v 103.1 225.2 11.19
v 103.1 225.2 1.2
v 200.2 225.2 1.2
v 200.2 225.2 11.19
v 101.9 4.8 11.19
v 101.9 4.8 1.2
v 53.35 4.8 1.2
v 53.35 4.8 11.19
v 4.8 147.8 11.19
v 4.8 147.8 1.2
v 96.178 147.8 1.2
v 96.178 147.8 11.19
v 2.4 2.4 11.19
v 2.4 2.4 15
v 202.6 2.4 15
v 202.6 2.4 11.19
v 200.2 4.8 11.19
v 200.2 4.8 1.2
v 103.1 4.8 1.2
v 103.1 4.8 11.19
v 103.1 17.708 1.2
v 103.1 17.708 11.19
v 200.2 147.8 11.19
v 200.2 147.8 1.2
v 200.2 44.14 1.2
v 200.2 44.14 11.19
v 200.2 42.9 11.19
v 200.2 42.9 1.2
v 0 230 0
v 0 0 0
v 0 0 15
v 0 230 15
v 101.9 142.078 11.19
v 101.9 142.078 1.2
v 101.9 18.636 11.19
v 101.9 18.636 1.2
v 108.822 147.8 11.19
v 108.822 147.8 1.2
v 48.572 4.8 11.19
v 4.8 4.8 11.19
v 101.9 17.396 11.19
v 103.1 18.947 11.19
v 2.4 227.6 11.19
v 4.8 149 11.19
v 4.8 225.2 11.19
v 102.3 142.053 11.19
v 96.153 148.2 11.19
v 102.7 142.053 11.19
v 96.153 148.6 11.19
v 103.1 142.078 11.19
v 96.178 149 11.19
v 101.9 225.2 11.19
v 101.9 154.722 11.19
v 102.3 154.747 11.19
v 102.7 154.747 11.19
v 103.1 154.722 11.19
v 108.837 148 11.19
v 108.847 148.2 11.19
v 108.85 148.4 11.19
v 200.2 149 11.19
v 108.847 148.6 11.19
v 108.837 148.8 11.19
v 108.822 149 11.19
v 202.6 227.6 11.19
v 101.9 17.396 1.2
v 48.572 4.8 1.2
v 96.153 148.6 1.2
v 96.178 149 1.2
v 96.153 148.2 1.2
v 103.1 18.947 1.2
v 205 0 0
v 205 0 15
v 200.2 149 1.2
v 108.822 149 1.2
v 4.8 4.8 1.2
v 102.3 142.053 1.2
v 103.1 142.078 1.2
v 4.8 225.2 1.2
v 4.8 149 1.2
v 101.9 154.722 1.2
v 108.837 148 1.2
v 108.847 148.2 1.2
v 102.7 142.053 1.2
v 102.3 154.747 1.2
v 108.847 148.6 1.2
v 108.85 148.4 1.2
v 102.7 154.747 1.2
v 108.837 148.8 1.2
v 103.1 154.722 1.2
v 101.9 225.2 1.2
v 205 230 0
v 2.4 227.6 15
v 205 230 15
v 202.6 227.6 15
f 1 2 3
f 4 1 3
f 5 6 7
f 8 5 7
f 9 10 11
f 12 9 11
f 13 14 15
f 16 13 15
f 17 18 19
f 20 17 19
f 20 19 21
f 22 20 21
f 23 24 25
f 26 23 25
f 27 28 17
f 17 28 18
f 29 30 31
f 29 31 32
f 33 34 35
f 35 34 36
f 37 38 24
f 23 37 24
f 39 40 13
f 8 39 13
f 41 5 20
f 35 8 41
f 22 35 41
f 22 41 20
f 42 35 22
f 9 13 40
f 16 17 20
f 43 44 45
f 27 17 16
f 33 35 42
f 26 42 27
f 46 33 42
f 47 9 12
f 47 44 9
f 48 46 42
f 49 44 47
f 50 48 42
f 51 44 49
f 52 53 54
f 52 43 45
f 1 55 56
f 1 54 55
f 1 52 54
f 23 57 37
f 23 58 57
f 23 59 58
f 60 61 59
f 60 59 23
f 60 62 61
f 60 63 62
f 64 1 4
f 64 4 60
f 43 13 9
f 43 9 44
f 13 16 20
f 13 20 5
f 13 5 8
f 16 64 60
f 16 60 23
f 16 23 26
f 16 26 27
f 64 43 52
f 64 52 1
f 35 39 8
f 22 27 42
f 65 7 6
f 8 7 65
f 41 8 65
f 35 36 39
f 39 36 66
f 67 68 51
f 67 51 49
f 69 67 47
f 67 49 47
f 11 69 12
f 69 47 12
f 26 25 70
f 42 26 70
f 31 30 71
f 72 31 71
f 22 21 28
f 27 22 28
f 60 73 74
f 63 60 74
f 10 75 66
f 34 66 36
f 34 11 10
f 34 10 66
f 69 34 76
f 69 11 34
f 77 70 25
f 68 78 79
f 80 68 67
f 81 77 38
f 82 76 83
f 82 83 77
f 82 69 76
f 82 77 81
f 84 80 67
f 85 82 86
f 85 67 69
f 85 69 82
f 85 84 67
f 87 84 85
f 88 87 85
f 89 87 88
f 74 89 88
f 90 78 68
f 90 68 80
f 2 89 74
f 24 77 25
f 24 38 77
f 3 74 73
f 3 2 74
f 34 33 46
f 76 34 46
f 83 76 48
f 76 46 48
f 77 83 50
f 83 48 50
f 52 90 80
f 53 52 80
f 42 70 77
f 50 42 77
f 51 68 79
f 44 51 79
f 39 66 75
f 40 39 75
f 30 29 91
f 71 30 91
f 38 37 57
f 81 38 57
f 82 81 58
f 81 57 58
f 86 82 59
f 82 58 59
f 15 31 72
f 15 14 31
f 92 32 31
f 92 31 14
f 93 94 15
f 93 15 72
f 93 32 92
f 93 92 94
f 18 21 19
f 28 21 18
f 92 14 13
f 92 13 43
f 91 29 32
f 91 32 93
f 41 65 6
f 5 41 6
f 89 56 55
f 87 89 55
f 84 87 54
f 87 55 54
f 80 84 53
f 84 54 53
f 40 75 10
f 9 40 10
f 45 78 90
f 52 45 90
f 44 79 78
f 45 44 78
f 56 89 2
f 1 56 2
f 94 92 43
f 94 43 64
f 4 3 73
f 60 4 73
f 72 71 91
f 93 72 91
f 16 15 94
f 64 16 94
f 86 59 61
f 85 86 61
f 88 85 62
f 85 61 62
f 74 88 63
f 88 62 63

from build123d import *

# Parameters (mm, degrees)
F0_W     = 205
F0_H     = 230
F1_DEPTH = 15
F2_W     = 200.2
F2_H     = 225.2
F3_DEPTH = 13.8
F4_W     = 200.2
F4_H     = 225.2
F5_DEPTH = 9.99
F7_DEPTH = 9.99
F9_DEPTH = 9.99


with BuildPart() as f1:
    # F0 (on Top) → F1 (new body)
    with BuildSketch(Plane.XY):
        with Locations((102.5, 115)):
            Rectangle(F0_W, F0_H)
    extrude(amount=F1_DEPTH)

    # F2 (on face) → F3 (cut, through all)
    with BuildSketch(Plane.XY.offset(15)):
        with Locations((102.5, 115)):
            Rectangle(F2_W, F2_H)
    extrude(amount=-F3_DEPTH, mode=Mode.SUBTRACT)

    # F4 (on face) → F5 (join, through all)
    with BuildSketch(Plane.XY.offset(1.2)):
        with Locations((102.5, 115)):
            Rectangle(F4_W, F4_H)
        Polygon((4.8, 149), (4.8, 225.2), (101.9, 225.2), (103.1, 225.2), (200.2, 225.2), (200.2, 149), (200.2, 147.8), (200.2, 4.8), (103.1, 4.8), (101.9, 4.8), (4.8, 4.8), (4.8, 147.8), align=None, mode=Mode.SUBTRACT)
        Polygon((103.1, 225.2), (101.9, 225.2), (101.9, 149), (4.8, 149), (4.8, 147.8), (101.9, 147.8), (101.9, 4.8), (103.1, 4.8), (103.1, 147.8), (200.2, 147.8), (200.2, 149), (103.1, 149), align=None)
    extrude(amount=F5_DEPTH)

    # F6 (on face) → F7 (cut, through all)
    with BuildSketch(Plane.XY.offset(11.19)):
        with BuildLine():
            Line((103.1, 154.7215899899), (103.1, 149))
            Line((103.1, 149), (108.8215899899, 149))
            ThreePointArc((108.8215899899, 149), (106.9901280605, 152.8901280605), (103.1, 154.7215899899))
        make_face()
        with BuildLine():
            Line((102.5, 148.4), (103.1, 149))
            Line((103.1, 149), (103.1, 154.7215899899))
            ThreePointArc((103.1, 154.7215899899), (102.5, 154.75), (101.9, 154.7215899899))
            Line((101.9, 154.7215899899), (101.9, 149))
            Line((101.9, 149), (102.5, 148.4))
        make_face()
        with BuildLine():
            Line((96.1784100101, 149), (101.9, 149))
            Line((101.9, 149), (101.9, 154.7215899899))
            ThreePointArc((101.9, 154.7215899899), (98.0098719395, 152.8901280605), (96.1784100101, 149))
        make_face()
        with BuildLine():
            Line((96.1784100101, 147.8), (101.9, 147.8))
            Line((101.9, 147.8), (101.9, 149))
            Line((101.9, 149), (96.1784100101, 149))
            ThreePointArc((96.1784100101, 149), (96.15, 148.4), (96.1784100101, 147.8))
        make_face()
        Polygon((101.9, 147.8), (102.5, 148.4), (101.9, 149), align=None)
        with BuildLine():
            Line((108.8215899899, 149), (103.1, 149))
            Line((103.1, 149), (102.5, 148.4))
            Line((102.5, 148.4), (103.1, 147.8))
            Line((103.1, 147.8), (108.8215899899, 147.8))
            ThreePointArc((108.8215899899, 147.8), (108.8428935209, 148.0996638847), (108.85, 148.4))
            ThreePointArc((108.85, 148.4), (108.8428935209, 148.7003361153), (108.8215899899, 149))
        make_face()
        with BuildLine():
            Line((103.1, 147.8), (102.5, 148.4))
            Line((102.5, 148.4), (101.9, 147.8))
            Line((101.9, 147.8), (101.9, 142.0784100101))
            ThreePointArc((101.9, 142.0784100101), (102.5, 142.05), (103.1, 142.0784100101))
            Line((103.1, 142.0784100101), (103.1, 147.8))
        make_face()
        with BuildLine():
            Line((108.8215899899, 147.8), (103.1, 147.8))
            Line((103.1, 147.8), (103.1, 142.0784100101))
            ThreePointArc((103.1, 142.0784100101), (106.9901280605, 143.9098719395), (108.8215899899, 147.8))
        make_face()
        with BuildLine():
            Line((101.9, 142.0784100101), (101.9, 147.8))
            Line((101.9, 147.8), (96.1784100101, 147.8))
            ThreePointArc((96.1784100101, 147.8), (98.0098719395, 143.9098719395), (101.9, 142.0784100101))
        make_face()
    extrude(amount=-F7_DEPTH, mode=Mode.SUBTRACT)

    # F8 (on face) → F9 (join, through all)
    with BuildSketch(Plane.XY.offset(1.2)):
        Polygon((200.2, 44.139730379), (103.1, 18.9472891124), (103.1, 17.7075587334), (200.2, 42.9), align=None)
        Polygon((101.9, 18.6359510123), (48.5716691298, 4.8), (53.35, 4.8), (101.9, 17.3962206333), align=None)
    extrude(amount=F9_DEPTH)


solid = f1.part
